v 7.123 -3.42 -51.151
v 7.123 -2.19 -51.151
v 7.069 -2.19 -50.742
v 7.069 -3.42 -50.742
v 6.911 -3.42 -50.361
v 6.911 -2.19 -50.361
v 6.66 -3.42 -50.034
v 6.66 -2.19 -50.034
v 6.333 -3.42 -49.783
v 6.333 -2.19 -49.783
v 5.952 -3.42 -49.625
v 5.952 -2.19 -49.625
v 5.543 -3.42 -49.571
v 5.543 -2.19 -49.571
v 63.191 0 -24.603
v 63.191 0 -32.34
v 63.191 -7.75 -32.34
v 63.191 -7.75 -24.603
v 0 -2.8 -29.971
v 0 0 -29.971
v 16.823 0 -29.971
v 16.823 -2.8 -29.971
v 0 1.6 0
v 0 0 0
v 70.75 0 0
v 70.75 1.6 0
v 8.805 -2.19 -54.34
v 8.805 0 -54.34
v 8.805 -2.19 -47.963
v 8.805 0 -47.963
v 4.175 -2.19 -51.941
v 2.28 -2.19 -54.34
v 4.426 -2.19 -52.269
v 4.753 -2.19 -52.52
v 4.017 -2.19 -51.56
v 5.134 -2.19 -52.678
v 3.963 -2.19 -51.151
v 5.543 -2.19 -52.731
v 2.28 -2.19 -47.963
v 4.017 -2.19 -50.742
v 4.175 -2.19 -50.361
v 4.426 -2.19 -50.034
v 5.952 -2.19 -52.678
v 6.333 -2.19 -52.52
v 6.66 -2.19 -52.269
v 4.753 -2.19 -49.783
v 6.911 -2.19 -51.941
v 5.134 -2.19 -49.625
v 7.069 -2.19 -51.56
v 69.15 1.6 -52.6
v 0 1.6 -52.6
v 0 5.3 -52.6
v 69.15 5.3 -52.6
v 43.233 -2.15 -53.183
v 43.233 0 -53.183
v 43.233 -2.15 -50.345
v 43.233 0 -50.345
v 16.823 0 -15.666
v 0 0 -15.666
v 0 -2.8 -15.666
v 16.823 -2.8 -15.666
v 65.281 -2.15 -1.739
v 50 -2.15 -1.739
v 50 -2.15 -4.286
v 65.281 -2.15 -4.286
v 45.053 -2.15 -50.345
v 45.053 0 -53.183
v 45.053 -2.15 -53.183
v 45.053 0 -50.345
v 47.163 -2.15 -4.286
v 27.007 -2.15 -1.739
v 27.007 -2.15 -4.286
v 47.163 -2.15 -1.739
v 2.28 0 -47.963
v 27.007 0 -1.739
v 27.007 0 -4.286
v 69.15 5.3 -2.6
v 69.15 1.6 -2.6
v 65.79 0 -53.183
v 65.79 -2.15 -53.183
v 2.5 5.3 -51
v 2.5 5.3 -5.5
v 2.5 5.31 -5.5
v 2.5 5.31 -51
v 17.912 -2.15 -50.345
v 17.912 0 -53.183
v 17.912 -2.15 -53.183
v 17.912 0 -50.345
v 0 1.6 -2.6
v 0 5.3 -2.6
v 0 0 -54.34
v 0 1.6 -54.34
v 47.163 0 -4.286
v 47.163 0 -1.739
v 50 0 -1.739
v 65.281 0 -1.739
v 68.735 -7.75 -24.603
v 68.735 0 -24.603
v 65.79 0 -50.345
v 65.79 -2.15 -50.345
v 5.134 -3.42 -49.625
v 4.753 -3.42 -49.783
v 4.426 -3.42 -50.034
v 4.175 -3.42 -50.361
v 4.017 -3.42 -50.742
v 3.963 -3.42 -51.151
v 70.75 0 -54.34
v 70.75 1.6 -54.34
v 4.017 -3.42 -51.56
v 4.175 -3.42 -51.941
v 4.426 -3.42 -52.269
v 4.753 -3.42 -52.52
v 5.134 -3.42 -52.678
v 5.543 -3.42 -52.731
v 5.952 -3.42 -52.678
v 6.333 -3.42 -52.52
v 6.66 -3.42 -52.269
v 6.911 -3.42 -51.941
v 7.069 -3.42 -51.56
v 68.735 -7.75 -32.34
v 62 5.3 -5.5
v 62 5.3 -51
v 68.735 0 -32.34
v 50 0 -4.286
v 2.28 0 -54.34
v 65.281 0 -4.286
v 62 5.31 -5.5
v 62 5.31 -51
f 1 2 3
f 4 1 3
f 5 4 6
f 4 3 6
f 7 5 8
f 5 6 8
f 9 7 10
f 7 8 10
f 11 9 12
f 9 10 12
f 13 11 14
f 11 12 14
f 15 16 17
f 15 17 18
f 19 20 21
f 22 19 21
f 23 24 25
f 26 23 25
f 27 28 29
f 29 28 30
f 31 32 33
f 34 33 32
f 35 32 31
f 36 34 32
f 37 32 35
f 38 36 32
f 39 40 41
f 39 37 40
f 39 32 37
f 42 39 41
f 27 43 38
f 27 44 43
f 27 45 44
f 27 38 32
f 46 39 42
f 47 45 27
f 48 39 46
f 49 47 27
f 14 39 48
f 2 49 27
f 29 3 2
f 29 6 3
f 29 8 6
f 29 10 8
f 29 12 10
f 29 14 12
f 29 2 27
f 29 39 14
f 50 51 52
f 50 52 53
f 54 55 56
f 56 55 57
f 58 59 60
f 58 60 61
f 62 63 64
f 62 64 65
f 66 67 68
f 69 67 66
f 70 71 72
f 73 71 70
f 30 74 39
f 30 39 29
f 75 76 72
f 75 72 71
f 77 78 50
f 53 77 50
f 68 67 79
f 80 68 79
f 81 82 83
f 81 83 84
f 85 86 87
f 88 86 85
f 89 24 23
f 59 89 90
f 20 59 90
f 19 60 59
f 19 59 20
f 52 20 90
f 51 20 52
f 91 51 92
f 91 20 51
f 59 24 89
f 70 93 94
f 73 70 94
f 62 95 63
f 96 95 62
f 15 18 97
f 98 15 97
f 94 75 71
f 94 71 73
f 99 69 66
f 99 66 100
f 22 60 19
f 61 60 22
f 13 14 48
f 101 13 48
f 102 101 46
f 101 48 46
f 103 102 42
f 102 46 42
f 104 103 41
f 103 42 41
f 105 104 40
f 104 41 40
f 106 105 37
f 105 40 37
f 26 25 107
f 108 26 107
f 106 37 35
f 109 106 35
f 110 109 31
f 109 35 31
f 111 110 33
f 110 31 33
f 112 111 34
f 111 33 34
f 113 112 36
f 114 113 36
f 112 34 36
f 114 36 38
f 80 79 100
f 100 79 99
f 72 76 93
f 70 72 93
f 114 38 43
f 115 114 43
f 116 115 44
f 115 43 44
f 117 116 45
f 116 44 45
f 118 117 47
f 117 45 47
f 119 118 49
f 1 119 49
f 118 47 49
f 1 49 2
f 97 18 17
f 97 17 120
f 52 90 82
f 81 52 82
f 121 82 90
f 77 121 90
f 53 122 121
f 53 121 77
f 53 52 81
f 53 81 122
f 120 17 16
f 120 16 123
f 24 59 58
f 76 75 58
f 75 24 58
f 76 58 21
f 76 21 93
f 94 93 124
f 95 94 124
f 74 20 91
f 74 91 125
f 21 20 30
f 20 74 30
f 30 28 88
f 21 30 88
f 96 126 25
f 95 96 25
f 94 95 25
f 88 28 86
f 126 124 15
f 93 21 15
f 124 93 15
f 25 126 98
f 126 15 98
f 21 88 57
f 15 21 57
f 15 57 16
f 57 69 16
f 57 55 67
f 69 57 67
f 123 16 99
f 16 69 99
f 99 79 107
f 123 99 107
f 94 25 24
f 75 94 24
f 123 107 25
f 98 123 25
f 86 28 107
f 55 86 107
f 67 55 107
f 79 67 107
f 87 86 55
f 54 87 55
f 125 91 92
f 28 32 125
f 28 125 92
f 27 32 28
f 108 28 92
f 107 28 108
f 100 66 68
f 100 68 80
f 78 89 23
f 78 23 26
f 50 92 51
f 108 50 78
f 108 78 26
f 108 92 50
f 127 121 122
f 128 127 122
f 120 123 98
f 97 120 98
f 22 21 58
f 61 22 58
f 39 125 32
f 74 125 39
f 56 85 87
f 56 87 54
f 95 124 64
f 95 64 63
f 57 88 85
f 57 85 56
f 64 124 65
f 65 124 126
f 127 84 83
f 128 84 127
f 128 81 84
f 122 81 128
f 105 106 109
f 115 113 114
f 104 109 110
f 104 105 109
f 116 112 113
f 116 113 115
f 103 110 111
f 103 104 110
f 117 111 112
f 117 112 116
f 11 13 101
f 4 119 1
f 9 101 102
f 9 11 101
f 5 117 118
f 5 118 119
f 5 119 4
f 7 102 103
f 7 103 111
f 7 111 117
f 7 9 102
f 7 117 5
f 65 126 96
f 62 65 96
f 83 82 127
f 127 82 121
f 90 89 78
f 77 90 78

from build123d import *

# Parameters (mm, degrees)
SKETCH1_W           = 70.75
SKETCH1_H           = 54.34
PCB_DEPTH           = 1.6
SKETCH2_W           = 69.15
SKETCH2_H           = 50
SCREEN_DEPTH        = 3.7
SKETCH3_W           = 59.5
SKETCH3_H           = 45.5
USABLE_SPACE_DEPTH  = 0.01
SKETCH4_W           = 16.823482751
SKETCH4_H           = 14.30589821
SD_SLOT_DEPTH       = 2.8
SKETCH6_W           = 6.52491574
SKETCH6_H           = 6.37715793
RESET_BUTTON_DEPTH  = 2.19
BOSS_EXTRUDE6_DEPTH = 1.23
SKETCH8_W           = 5.544724278
SKETCH8_H           = 7.737048543
BOSS_EXTRUDE7_DEPTH = 7.75
SKETCH9_W           = 20.155505067
SKETCH9_H           = 2.546724467
SKETCH9_W_2         = 15.280346801
SKETCH9_W_3         = 25.321717556
SKETCH9_H_2         = 2.837778691
SKETCH9_W_4         = 20.737613516
PINS_DEPTH          = 2.15


with BuildPart() as part:
    # Sketch1 → PCB (new body)
    with BuildSketch(Plane(origin=(0, 0, 0), x_dir=(1, 0, 0), z_dir=(0, 1, 0))):
        with Locations((35.375, 27.17)):
            Rectangle(SKETCH1_W, SKETCH1_H)
    extrude(amount=PCB_DEPTH)

    # Sketch2 → Screen (add)
    with BuildSketch(Plane(origin=(0, 1.6, 0), x_dir=(1, 0, 0), z_dir=(0, 1, 0))):
        with Locations((34.575, 27.6)):
            Rectangle(SKETCH2_W, SKETCH2_H)
    extrude(amount=SCREEN_DEPTH)

    # Sketch3 → usable space (add)
    with BuildSketch(Plane(origin=(0, 5.3, 0), x_dir=(1, 0, 0), z_dir=(0, 1, 0))):
        with Locations((32.25, 28.25)):
            Rectangle(SKETCH3_W, SKETCH3_H)
    extrude(amount=USABLE_SPACE_DEPTH)

    # Sketch4 → SD slot (add)
    with BuildSketch(Plane.XZ):
        with Locations((8.411741376, -22.818507851)):
            Rectangle(SKETCH4_W, SKETCH4_H)
    extrude(amount=SD_SLOT_DEPTH)

    # Sketch6 → reset button (add)
    with BuildSketch(Plane.XZ):
        with Locations((5.542908416, -51.151421035)):
            Rectangle(SKETCH6_W, SKETCH6_H)
    extrude(amount=RESET_BUTTON_DEPTH)

    # Sketch7 → Boss-Extrude6 (add)
    with BuildSketch(Plane.XZ.offset(2.19)):
        with BuildLine():
            ThreePointArc((5.542908416, -49.571421035), (4.425679702, -50.034192321), (3.962908416, -51.151421035))
            Line((3.962908416, -51.151421035), (5.542908416, -51.151421035))
            Line((5.542908416, -51.151421035), (5.542908416, -49.571421035))
        make_face()
        with BuildLine():
            Line((5.542908416, -51.151421035), (3.962908416, -51.151421035))
            ThreePointArc((3.962908416, -51.151421035), (4.425679702, -52.268649749), (5.542908416, -52.731421035))
            Line((5.542908416, -52.731421035), (5.542908416, -51.151421035))
        make_face()
        with BuildLine():
            Line((5.542908416, -49.571421035), (5.542908416, -51.151421035))
            Line((5.542908416, -51.151421035), (7.122908416, -51.151421035))
            ThreePointArc((7.122908416, -51.151421035), (6.66013713, -50.034192321), (5.542908416, -49.571421035))
        make_face()
        with BuildLine():
            Line((7.122908416, -51.151421035), (5.542908416, -51.151421035))
            Line((5.542908416, -51.151421035), (5.542908416, -52.731421035))
            ThreePointArc((5.542908416, -52.731421035), (6.66013713, -52.268649749), (7.122908416, -51.151421035))
        make_face()
    extrude(amount=BOSS_EXTRUDE6_DEPTH)

    # Sketch8 → Boss-Extrude7 (add)
    with BuildSketch(Plane.XZ):
        with Locations((65.962973945, -28.471475729)):
            Rectangle(SKETCH8_W, SKETCH8_H)
    extrude(amount=BOSS_EXTRUDE7_DEPTH)

    # Sketch9 → pins (add)
    with BuildSketch(Plane.XZ):
        with Locations((37.084943571, -3.012499342)):
            Rectangle(SKETCH9_W, SKETCH9_H)
        with Locations((57.640648197, -3.012499342)):
            Rectangle(SKETCH9_W_2, SKETCH9_H)
        with Locations((30.572605291, -51.764081995)):
            Rectangle(SKETCH9_W_3, SKETCH9_H_2)
        with Locations((55.421359732, -51.764081995)):
            Rectangle(SKETCH9_W_4, SKETCH9_H_2)
    extrude(amount=PINS_DEPTH)


solid = part.part
